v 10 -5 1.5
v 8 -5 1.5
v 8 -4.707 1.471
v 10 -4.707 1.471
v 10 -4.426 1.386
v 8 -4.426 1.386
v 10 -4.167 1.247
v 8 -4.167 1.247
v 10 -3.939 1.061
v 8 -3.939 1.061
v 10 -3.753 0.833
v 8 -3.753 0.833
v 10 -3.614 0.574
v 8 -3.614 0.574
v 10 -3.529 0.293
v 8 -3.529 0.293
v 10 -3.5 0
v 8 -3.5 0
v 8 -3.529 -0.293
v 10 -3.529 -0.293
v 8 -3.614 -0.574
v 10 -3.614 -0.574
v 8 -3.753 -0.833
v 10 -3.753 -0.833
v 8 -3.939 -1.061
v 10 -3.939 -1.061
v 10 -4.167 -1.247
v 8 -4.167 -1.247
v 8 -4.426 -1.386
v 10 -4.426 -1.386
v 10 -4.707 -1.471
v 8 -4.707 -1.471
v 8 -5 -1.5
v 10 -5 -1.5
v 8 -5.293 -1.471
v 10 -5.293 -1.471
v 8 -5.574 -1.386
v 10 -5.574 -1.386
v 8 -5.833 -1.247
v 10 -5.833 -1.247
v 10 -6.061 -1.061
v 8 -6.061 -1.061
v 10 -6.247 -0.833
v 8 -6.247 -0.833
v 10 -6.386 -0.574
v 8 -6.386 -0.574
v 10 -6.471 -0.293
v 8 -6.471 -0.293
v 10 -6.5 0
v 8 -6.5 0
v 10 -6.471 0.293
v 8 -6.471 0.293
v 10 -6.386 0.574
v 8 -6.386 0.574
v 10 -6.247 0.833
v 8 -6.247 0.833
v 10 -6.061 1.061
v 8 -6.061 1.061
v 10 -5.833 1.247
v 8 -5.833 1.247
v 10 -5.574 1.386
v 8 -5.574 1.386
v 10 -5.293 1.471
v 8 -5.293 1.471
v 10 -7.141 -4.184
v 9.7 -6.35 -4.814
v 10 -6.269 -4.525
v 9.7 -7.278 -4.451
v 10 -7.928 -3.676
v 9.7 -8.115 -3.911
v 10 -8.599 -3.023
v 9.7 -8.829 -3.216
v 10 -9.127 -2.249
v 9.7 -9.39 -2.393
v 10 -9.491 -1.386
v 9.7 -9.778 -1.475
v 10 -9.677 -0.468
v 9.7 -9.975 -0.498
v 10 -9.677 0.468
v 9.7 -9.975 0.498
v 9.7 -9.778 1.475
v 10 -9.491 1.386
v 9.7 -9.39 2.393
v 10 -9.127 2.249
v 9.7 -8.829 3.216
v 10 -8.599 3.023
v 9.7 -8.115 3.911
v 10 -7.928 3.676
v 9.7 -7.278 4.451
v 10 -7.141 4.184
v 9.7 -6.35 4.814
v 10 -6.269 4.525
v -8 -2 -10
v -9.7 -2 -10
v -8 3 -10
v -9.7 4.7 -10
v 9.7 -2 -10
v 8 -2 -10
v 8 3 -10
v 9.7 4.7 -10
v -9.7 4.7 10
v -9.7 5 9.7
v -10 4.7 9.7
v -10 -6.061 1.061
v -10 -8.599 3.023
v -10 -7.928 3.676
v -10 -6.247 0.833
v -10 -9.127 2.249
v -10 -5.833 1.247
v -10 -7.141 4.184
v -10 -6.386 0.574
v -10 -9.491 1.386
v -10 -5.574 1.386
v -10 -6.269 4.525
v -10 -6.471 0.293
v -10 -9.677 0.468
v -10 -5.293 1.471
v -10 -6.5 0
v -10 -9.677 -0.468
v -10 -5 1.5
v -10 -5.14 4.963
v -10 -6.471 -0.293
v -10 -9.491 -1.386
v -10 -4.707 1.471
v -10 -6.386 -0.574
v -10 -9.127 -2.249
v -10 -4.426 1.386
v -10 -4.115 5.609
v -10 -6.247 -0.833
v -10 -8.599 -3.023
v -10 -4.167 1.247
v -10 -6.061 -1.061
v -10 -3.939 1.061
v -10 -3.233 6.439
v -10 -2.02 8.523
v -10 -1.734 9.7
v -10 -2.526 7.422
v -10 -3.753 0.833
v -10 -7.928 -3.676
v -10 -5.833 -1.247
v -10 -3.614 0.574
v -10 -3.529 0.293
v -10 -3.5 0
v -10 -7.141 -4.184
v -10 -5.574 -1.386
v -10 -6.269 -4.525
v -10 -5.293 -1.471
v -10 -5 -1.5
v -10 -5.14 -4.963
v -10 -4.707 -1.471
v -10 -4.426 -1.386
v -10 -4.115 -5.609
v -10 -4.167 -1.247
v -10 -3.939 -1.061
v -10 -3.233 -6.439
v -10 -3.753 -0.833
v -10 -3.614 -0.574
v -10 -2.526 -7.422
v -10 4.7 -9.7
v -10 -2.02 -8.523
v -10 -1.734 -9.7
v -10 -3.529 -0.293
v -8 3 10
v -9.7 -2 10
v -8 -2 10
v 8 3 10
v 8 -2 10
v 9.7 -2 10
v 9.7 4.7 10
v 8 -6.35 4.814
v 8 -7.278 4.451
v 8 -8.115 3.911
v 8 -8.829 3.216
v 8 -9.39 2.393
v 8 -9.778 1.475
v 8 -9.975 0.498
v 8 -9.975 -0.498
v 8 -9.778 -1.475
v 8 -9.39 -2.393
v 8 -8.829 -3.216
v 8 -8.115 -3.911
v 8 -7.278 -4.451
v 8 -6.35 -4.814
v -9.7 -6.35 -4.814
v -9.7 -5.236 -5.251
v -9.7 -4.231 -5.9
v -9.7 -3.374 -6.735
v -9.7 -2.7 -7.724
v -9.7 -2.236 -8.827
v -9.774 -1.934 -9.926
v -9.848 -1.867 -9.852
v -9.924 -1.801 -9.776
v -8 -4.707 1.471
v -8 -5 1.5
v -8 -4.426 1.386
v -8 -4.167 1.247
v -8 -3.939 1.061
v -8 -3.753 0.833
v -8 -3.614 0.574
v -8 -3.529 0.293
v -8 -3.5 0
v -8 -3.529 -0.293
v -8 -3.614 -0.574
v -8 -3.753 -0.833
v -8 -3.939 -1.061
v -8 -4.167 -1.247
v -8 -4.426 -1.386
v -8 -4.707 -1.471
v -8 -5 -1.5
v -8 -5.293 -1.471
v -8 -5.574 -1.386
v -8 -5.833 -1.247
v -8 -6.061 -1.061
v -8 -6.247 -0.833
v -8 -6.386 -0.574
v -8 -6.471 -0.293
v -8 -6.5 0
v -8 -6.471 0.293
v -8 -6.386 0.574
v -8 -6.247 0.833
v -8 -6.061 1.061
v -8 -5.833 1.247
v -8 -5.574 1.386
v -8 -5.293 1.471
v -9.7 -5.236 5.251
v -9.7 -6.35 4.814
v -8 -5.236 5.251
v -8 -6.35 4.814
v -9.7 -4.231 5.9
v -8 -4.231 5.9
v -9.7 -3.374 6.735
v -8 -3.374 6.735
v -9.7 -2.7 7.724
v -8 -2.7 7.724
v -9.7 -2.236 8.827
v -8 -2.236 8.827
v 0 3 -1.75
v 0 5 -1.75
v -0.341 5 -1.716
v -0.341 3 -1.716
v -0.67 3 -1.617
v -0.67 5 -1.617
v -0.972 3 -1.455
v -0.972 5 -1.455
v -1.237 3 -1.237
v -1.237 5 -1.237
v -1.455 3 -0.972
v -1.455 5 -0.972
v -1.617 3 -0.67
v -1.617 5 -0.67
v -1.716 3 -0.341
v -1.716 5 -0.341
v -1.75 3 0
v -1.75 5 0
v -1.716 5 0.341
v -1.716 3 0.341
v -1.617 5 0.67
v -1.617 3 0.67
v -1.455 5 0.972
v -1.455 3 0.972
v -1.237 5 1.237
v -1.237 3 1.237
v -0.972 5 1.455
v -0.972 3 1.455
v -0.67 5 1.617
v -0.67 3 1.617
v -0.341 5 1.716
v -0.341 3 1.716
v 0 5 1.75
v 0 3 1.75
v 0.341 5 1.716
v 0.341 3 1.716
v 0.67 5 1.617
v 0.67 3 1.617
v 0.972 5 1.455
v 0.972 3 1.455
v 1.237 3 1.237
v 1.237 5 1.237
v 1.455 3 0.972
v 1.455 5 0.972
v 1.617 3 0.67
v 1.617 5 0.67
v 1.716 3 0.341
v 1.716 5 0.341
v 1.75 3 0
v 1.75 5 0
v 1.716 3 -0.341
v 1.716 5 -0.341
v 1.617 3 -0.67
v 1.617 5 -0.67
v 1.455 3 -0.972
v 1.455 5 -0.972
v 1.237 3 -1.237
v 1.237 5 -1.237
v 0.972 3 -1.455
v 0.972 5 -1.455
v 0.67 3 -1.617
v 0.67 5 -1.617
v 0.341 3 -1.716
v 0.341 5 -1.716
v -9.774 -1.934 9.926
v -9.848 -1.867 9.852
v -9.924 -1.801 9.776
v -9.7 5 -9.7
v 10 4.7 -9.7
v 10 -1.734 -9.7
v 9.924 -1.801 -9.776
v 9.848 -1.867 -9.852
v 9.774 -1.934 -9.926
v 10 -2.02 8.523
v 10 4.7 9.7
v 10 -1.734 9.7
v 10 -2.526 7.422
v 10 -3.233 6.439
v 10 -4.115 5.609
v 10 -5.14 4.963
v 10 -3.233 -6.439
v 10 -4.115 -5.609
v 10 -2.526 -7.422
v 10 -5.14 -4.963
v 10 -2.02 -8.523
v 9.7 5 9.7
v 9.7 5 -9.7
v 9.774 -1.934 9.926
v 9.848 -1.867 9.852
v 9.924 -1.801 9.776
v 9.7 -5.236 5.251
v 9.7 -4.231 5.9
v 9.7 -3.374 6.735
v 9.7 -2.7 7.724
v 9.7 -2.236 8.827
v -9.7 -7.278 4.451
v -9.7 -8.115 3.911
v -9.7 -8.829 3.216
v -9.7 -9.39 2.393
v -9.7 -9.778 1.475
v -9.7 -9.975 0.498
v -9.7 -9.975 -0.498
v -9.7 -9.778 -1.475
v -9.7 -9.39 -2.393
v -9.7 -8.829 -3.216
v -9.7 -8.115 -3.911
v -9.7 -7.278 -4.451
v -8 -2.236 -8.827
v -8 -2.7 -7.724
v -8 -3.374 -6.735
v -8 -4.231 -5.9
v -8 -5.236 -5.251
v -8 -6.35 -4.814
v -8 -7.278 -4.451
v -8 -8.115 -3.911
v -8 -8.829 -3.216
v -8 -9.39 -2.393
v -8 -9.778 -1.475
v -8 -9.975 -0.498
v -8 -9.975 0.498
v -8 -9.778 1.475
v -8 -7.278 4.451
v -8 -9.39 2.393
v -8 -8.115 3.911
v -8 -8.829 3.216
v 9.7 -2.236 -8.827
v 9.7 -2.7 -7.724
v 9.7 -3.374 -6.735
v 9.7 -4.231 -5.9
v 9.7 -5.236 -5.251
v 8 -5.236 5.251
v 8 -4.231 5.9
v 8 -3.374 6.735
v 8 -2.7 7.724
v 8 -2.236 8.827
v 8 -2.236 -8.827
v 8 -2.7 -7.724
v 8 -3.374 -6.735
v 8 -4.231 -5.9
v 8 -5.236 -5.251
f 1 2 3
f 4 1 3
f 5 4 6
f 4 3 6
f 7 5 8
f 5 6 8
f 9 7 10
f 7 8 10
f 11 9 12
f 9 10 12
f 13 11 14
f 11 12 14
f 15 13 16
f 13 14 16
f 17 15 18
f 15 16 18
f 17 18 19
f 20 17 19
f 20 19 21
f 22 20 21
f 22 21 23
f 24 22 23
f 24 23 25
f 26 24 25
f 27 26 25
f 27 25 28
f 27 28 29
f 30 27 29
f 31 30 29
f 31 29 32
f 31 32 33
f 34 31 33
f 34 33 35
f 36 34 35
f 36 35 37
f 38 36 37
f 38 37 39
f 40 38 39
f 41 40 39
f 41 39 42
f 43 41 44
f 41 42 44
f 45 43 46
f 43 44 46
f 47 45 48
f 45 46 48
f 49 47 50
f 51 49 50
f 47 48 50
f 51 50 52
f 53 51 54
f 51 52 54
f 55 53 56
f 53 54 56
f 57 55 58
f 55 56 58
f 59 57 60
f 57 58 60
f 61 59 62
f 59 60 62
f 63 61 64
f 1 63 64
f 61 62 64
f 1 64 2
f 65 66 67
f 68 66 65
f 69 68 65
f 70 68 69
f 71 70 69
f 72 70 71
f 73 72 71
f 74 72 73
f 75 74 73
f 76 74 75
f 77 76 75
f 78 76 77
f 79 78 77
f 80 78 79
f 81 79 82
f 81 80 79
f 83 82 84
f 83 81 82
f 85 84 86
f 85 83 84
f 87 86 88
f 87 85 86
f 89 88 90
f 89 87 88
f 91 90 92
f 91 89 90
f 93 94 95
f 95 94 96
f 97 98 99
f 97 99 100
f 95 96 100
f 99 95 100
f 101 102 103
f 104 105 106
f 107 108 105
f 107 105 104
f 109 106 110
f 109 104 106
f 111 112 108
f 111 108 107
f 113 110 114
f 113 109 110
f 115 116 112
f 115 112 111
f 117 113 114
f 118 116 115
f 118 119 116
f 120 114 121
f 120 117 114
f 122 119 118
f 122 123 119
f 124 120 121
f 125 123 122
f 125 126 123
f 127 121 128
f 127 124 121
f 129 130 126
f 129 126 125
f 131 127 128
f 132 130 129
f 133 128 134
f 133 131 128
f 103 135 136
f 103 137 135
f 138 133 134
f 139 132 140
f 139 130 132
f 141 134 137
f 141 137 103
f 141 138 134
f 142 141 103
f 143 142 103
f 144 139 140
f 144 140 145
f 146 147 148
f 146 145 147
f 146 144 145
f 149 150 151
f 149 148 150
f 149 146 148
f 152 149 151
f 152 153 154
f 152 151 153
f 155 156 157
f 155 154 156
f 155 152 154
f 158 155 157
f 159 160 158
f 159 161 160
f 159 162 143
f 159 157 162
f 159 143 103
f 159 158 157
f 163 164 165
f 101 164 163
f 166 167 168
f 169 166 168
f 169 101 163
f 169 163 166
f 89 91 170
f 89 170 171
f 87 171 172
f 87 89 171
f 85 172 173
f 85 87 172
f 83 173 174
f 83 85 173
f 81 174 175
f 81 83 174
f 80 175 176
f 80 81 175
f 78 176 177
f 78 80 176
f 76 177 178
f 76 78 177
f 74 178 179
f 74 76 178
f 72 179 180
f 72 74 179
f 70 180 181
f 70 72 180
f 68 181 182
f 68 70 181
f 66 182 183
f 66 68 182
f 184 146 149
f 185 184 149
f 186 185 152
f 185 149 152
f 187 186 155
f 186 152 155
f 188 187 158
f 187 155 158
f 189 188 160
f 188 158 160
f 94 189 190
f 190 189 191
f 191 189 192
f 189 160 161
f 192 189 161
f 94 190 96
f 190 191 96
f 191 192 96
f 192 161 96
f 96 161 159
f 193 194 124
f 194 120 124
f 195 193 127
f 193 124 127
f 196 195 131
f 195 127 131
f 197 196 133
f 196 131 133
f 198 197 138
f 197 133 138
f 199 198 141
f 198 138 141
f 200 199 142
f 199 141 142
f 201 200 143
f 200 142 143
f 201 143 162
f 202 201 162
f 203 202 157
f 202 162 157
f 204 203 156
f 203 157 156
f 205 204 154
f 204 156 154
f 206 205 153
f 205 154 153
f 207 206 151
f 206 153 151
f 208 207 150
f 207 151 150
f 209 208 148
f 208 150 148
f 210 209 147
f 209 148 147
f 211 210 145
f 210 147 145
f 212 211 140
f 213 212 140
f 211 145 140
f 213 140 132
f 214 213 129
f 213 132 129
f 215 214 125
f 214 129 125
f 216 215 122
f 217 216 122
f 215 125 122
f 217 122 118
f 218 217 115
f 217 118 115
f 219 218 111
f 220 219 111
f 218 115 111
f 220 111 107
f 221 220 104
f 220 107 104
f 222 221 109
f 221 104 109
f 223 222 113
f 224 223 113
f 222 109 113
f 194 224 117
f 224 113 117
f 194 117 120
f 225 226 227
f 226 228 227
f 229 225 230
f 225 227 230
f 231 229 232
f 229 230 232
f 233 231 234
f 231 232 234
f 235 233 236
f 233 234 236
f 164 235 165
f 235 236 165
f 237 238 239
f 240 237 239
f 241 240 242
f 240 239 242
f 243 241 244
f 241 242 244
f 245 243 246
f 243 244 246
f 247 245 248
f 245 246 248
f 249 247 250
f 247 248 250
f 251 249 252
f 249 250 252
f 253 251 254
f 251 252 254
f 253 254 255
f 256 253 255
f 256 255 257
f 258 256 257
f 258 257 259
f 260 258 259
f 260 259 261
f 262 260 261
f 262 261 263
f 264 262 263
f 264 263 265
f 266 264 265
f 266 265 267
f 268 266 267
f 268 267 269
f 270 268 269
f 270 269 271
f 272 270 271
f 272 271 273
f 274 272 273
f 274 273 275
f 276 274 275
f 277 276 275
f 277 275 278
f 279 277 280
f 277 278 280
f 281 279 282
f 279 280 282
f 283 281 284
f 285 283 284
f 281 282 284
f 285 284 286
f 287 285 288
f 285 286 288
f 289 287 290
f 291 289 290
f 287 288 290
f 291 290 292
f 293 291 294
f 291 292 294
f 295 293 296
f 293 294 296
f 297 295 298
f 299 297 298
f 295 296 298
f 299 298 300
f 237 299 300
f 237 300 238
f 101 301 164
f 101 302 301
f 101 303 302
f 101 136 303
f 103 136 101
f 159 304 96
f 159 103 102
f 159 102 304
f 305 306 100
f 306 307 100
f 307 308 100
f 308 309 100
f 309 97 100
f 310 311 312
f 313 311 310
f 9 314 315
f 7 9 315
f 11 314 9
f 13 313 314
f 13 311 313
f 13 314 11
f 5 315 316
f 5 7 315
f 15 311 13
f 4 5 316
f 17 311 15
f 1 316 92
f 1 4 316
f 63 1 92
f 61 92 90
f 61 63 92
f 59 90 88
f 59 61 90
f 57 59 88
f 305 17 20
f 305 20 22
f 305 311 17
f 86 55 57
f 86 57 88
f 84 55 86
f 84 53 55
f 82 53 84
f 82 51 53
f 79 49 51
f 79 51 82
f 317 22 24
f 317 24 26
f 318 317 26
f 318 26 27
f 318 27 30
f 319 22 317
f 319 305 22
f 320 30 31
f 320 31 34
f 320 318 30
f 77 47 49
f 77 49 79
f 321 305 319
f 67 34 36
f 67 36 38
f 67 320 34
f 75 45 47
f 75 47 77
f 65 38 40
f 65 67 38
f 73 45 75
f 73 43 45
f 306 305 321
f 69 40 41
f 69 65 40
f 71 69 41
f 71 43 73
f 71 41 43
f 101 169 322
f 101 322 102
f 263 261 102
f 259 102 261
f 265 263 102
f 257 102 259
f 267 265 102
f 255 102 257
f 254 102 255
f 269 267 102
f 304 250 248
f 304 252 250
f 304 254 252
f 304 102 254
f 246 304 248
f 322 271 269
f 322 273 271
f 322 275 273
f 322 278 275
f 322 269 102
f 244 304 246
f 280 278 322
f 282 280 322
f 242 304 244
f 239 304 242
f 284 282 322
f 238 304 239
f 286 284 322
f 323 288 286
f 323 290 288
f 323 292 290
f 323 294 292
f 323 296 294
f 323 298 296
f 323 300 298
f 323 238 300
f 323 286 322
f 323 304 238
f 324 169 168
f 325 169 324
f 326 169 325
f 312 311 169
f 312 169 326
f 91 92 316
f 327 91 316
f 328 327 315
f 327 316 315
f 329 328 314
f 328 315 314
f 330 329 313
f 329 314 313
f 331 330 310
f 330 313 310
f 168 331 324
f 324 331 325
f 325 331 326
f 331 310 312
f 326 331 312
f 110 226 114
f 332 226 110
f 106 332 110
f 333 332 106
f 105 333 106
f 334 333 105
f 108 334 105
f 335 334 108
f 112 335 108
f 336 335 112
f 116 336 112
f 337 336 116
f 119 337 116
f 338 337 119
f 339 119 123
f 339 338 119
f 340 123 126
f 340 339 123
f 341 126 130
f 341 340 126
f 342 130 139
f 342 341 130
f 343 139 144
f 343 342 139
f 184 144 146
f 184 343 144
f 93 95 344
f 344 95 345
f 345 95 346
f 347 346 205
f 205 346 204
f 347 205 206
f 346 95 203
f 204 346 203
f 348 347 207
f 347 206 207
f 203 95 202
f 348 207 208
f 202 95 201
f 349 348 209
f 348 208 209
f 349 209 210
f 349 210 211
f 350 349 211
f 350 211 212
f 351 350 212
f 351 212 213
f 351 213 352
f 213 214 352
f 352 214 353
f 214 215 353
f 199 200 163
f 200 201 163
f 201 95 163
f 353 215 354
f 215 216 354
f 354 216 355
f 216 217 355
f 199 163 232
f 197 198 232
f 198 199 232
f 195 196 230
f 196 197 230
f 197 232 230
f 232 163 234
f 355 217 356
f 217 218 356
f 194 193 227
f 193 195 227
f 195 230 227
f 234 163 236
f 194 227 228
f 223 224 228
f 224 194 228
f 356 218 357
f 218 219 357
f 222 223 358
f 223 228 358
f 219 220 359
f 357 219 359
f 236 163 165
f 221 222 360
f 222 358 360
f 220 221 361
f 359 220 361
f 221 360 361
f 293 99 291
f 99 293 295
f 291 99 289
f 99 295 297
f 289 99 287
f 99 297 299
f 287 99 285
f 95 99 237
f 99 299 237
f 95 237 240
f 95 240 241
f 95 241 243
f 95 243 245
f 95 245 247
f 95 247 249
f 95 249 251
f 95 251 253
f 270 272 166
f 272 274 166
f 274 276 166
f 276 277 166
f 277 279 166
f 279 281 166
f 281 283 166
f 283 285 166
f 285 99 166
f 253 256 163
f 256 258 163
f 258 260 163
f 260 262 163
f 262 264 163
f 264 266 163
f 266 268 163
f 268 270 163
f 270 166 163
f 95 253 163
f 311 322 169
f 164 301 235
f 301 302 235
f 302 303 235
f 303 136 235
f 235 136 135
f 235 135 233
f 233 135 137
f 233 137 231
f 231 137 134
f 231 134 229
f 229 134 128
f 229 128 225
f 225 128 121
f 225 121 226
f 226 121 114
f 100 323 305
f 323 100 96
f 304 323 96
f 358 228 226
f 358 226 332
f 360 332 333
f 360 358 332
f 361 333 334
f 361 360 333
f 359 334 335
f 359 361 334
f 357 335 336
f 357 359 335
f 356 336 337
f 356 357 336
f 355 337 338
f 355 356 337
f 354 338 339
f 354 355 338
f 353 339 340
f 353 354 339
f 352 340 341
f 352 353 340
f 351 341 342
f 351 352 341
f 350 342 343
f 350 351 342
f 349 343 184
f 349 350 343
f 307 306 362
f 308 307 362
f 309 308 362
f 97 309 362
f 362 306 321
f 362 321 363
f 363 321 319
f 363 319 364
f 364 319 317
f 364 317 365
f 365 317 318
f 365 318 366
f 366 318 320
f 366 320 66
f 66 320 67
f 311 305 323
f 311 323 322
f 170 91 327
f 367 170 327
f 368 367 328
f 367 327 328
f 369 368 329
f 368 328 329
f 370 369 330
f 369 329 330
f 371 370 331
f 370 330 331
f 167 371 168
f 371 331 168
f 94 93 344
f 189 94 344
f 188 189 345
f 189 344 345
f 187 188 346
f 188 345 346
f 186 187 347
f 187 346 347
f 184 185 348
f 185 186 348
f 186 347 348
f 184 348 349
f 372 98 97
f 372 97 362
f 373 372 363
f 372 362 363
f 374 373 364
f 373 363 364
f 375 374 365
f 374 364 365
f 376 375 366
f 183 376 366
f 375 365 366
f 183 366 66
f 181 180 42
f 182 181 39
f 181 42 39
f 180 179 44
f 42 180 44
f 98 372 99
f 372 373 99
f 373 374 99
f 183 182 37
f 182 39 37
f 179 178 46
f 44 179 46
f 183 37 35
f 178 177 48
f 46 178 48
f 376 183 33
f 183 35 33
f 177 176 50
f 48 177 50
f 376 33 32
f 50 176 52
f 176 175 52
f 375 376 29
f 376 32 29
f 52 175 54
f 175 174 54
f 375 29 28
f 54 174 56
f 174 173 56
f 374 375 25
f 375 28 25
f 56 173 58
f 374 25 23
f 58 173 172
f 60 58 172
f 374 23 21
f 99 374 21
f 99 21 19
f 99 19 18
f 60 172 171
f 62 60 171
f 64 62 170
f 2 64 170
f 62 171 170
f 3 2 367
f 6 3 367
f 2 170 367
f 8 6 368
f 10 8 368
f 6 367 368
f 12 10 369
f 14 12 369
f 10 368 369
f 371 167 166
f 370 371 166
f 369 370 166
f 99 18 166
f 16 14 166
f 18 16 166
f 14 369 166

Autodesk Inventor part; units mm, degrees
ref_plane "YZ Plane" through (0, 0, 0) normal (1, 0, 0) x (0, 1, 0)
ref_plane "XZ Plane" through (0, 0, 0) normal (0, 1, 0) x (-1, 0, 0)
ref_plane "XY Plane" through (0, 0, 0) normal (0, 0, 1) x (1, 0, 0)
sketch "Sketch1" plane through (0, 0, 0) normal (0, 0, 1) x (1, 0, 0)
  line L0 (-10, 5) -> (10, 5)
  line L1 (10, 5) -> (10, -5)
  line L2 (10, -5) -> (-10, -5)
  line L3 (-10, -5) -> (-10, 5)
  line L4 (-10, 5) -> (10, -5) construction
  line L5 (10, 5) -> (-10, -5) construction
  point P0 (0, 0)
extrude "Extrusion1" add sketch "Sketch1" along normal mid plane 20
sketch "Sketch3" plane through (10, -5, 10) normal (1, 0, 0) x (0, 0, -1)
  point P0 (10, 5)
sketch "Sketch4" plane through (10, -5, 10) normal (1, 0, 0) x (0, 0, -1)
  line L0 (0, 0) -> (20, 0) projected
  arc A0 (5, 0) -> (15, 0) centre (10, 0) ccw
  point P0 (10, 5)
  dimension "d9" = 10
extrude "Extrusion3" add sketch "Sketch4" against normal up to surface (20 mm away)
sketch "Sketch2" plane through (0, 0, 10) normal (0, 0, 1) x (1, 0, 0)
  line L0 (-8, -16.4616) -> (8, -16.4616)
  line L1 (8, -16.4616) -> (8, 3)
  line L2 (8, 3) -> (-8, 3)
  line L3 (-8, 3) -> (-8, -16.4616)
  line L4 (-10, 5) -> (-10, -5) projected
  line L5 (10, -5) -> (10, 5) projected
  line L6 (10, 5) -> (-10, 5) projected
  point P0 (0, 0)
  dimension "d4" = 2
  dimension "d5" = 2
  dimension "d6" = 2
extrude "Extrusion2" cut sketch "Sketch2" against normal blind 30
sketch "Sketch5" plane through (10, -5, 10) normal (1, 0, 0) x (0, 0, -1)
  line L0 (0, 8) -> (0, 0) projected
  line L1 (5, 0) -> (0, 0) projected
  line L2 (0, 3) -> (5, 3)
  line L3 (5, 3) -> (5, 0)
  line L4 (5, 0) -> (0, 0)
  line L5 (0, 0) -> (0, 3)
  arc A0 (5, 0) -> (15, 0) centre (10, 0) ccw projected
  line L6 (20, 10) -> (20, 0) projected
  line L7 (15, 0) -> (20, 0)
  line L8 (20, 0) -> (20, 3)
  line L9 (20, 3) -> (15, 3)
  line L10 (15, 3) -> (15, 0)
  point P0 (10, 5)
  dimension "d12" = 3
extrude "Extrusion4" cut sketch "Sketch5" against normal blind 30
fillet "Fillet1" radius 6 4 edges at (9, -2, 5) (9, -2, -5) (-9, -2, 5) (-9, -2, -5)
chamfer "Chamfer1" distance 0.3 angle 45 12 edges at (0, 5, 10) (10, 5, 0) (0, 5, -10) (-10, 5, 0) (-10, 1.5, 10) (10, 1.5, 10) (10, 1.5, -10) (-10, 1.5, -10) (-10, -3.3741, 6.7351) (10, -3.3741, -6.7351) (10, -10, 0) (10, -3.3741, 6.7351)
sketch "Sketch6" plane through (-10, -4.2, -14.7) normal (-1, 0, 0) x (0, 0, 1)
  arc A0 (9.8858, -2.1504) -> (19.5142, -2.1504) centre (14.7, -0.8) ccw projected
  circle A1 centre (14.7, -0.8) radius 1.5
  point P0 (14.7, 4.2)
  dimension "d20" = 3
extrude "Extrusion5" cut sketch "Sketch6" against normal blind 30
sketch "Sketch7" plane through (-8, 3, 10) normal (0, -1, 0) x (1, 0, 0)
  point P0 (8, -10)
  point P1 (8, -10)
hole "Hole1" at (0, 3, 0) direction (0, 1, 0) diameter 3.5 depth 11.8 tip angle 118
properties part number "Ball Track Mounting Plate" material "Brass, Soft Yellow"
